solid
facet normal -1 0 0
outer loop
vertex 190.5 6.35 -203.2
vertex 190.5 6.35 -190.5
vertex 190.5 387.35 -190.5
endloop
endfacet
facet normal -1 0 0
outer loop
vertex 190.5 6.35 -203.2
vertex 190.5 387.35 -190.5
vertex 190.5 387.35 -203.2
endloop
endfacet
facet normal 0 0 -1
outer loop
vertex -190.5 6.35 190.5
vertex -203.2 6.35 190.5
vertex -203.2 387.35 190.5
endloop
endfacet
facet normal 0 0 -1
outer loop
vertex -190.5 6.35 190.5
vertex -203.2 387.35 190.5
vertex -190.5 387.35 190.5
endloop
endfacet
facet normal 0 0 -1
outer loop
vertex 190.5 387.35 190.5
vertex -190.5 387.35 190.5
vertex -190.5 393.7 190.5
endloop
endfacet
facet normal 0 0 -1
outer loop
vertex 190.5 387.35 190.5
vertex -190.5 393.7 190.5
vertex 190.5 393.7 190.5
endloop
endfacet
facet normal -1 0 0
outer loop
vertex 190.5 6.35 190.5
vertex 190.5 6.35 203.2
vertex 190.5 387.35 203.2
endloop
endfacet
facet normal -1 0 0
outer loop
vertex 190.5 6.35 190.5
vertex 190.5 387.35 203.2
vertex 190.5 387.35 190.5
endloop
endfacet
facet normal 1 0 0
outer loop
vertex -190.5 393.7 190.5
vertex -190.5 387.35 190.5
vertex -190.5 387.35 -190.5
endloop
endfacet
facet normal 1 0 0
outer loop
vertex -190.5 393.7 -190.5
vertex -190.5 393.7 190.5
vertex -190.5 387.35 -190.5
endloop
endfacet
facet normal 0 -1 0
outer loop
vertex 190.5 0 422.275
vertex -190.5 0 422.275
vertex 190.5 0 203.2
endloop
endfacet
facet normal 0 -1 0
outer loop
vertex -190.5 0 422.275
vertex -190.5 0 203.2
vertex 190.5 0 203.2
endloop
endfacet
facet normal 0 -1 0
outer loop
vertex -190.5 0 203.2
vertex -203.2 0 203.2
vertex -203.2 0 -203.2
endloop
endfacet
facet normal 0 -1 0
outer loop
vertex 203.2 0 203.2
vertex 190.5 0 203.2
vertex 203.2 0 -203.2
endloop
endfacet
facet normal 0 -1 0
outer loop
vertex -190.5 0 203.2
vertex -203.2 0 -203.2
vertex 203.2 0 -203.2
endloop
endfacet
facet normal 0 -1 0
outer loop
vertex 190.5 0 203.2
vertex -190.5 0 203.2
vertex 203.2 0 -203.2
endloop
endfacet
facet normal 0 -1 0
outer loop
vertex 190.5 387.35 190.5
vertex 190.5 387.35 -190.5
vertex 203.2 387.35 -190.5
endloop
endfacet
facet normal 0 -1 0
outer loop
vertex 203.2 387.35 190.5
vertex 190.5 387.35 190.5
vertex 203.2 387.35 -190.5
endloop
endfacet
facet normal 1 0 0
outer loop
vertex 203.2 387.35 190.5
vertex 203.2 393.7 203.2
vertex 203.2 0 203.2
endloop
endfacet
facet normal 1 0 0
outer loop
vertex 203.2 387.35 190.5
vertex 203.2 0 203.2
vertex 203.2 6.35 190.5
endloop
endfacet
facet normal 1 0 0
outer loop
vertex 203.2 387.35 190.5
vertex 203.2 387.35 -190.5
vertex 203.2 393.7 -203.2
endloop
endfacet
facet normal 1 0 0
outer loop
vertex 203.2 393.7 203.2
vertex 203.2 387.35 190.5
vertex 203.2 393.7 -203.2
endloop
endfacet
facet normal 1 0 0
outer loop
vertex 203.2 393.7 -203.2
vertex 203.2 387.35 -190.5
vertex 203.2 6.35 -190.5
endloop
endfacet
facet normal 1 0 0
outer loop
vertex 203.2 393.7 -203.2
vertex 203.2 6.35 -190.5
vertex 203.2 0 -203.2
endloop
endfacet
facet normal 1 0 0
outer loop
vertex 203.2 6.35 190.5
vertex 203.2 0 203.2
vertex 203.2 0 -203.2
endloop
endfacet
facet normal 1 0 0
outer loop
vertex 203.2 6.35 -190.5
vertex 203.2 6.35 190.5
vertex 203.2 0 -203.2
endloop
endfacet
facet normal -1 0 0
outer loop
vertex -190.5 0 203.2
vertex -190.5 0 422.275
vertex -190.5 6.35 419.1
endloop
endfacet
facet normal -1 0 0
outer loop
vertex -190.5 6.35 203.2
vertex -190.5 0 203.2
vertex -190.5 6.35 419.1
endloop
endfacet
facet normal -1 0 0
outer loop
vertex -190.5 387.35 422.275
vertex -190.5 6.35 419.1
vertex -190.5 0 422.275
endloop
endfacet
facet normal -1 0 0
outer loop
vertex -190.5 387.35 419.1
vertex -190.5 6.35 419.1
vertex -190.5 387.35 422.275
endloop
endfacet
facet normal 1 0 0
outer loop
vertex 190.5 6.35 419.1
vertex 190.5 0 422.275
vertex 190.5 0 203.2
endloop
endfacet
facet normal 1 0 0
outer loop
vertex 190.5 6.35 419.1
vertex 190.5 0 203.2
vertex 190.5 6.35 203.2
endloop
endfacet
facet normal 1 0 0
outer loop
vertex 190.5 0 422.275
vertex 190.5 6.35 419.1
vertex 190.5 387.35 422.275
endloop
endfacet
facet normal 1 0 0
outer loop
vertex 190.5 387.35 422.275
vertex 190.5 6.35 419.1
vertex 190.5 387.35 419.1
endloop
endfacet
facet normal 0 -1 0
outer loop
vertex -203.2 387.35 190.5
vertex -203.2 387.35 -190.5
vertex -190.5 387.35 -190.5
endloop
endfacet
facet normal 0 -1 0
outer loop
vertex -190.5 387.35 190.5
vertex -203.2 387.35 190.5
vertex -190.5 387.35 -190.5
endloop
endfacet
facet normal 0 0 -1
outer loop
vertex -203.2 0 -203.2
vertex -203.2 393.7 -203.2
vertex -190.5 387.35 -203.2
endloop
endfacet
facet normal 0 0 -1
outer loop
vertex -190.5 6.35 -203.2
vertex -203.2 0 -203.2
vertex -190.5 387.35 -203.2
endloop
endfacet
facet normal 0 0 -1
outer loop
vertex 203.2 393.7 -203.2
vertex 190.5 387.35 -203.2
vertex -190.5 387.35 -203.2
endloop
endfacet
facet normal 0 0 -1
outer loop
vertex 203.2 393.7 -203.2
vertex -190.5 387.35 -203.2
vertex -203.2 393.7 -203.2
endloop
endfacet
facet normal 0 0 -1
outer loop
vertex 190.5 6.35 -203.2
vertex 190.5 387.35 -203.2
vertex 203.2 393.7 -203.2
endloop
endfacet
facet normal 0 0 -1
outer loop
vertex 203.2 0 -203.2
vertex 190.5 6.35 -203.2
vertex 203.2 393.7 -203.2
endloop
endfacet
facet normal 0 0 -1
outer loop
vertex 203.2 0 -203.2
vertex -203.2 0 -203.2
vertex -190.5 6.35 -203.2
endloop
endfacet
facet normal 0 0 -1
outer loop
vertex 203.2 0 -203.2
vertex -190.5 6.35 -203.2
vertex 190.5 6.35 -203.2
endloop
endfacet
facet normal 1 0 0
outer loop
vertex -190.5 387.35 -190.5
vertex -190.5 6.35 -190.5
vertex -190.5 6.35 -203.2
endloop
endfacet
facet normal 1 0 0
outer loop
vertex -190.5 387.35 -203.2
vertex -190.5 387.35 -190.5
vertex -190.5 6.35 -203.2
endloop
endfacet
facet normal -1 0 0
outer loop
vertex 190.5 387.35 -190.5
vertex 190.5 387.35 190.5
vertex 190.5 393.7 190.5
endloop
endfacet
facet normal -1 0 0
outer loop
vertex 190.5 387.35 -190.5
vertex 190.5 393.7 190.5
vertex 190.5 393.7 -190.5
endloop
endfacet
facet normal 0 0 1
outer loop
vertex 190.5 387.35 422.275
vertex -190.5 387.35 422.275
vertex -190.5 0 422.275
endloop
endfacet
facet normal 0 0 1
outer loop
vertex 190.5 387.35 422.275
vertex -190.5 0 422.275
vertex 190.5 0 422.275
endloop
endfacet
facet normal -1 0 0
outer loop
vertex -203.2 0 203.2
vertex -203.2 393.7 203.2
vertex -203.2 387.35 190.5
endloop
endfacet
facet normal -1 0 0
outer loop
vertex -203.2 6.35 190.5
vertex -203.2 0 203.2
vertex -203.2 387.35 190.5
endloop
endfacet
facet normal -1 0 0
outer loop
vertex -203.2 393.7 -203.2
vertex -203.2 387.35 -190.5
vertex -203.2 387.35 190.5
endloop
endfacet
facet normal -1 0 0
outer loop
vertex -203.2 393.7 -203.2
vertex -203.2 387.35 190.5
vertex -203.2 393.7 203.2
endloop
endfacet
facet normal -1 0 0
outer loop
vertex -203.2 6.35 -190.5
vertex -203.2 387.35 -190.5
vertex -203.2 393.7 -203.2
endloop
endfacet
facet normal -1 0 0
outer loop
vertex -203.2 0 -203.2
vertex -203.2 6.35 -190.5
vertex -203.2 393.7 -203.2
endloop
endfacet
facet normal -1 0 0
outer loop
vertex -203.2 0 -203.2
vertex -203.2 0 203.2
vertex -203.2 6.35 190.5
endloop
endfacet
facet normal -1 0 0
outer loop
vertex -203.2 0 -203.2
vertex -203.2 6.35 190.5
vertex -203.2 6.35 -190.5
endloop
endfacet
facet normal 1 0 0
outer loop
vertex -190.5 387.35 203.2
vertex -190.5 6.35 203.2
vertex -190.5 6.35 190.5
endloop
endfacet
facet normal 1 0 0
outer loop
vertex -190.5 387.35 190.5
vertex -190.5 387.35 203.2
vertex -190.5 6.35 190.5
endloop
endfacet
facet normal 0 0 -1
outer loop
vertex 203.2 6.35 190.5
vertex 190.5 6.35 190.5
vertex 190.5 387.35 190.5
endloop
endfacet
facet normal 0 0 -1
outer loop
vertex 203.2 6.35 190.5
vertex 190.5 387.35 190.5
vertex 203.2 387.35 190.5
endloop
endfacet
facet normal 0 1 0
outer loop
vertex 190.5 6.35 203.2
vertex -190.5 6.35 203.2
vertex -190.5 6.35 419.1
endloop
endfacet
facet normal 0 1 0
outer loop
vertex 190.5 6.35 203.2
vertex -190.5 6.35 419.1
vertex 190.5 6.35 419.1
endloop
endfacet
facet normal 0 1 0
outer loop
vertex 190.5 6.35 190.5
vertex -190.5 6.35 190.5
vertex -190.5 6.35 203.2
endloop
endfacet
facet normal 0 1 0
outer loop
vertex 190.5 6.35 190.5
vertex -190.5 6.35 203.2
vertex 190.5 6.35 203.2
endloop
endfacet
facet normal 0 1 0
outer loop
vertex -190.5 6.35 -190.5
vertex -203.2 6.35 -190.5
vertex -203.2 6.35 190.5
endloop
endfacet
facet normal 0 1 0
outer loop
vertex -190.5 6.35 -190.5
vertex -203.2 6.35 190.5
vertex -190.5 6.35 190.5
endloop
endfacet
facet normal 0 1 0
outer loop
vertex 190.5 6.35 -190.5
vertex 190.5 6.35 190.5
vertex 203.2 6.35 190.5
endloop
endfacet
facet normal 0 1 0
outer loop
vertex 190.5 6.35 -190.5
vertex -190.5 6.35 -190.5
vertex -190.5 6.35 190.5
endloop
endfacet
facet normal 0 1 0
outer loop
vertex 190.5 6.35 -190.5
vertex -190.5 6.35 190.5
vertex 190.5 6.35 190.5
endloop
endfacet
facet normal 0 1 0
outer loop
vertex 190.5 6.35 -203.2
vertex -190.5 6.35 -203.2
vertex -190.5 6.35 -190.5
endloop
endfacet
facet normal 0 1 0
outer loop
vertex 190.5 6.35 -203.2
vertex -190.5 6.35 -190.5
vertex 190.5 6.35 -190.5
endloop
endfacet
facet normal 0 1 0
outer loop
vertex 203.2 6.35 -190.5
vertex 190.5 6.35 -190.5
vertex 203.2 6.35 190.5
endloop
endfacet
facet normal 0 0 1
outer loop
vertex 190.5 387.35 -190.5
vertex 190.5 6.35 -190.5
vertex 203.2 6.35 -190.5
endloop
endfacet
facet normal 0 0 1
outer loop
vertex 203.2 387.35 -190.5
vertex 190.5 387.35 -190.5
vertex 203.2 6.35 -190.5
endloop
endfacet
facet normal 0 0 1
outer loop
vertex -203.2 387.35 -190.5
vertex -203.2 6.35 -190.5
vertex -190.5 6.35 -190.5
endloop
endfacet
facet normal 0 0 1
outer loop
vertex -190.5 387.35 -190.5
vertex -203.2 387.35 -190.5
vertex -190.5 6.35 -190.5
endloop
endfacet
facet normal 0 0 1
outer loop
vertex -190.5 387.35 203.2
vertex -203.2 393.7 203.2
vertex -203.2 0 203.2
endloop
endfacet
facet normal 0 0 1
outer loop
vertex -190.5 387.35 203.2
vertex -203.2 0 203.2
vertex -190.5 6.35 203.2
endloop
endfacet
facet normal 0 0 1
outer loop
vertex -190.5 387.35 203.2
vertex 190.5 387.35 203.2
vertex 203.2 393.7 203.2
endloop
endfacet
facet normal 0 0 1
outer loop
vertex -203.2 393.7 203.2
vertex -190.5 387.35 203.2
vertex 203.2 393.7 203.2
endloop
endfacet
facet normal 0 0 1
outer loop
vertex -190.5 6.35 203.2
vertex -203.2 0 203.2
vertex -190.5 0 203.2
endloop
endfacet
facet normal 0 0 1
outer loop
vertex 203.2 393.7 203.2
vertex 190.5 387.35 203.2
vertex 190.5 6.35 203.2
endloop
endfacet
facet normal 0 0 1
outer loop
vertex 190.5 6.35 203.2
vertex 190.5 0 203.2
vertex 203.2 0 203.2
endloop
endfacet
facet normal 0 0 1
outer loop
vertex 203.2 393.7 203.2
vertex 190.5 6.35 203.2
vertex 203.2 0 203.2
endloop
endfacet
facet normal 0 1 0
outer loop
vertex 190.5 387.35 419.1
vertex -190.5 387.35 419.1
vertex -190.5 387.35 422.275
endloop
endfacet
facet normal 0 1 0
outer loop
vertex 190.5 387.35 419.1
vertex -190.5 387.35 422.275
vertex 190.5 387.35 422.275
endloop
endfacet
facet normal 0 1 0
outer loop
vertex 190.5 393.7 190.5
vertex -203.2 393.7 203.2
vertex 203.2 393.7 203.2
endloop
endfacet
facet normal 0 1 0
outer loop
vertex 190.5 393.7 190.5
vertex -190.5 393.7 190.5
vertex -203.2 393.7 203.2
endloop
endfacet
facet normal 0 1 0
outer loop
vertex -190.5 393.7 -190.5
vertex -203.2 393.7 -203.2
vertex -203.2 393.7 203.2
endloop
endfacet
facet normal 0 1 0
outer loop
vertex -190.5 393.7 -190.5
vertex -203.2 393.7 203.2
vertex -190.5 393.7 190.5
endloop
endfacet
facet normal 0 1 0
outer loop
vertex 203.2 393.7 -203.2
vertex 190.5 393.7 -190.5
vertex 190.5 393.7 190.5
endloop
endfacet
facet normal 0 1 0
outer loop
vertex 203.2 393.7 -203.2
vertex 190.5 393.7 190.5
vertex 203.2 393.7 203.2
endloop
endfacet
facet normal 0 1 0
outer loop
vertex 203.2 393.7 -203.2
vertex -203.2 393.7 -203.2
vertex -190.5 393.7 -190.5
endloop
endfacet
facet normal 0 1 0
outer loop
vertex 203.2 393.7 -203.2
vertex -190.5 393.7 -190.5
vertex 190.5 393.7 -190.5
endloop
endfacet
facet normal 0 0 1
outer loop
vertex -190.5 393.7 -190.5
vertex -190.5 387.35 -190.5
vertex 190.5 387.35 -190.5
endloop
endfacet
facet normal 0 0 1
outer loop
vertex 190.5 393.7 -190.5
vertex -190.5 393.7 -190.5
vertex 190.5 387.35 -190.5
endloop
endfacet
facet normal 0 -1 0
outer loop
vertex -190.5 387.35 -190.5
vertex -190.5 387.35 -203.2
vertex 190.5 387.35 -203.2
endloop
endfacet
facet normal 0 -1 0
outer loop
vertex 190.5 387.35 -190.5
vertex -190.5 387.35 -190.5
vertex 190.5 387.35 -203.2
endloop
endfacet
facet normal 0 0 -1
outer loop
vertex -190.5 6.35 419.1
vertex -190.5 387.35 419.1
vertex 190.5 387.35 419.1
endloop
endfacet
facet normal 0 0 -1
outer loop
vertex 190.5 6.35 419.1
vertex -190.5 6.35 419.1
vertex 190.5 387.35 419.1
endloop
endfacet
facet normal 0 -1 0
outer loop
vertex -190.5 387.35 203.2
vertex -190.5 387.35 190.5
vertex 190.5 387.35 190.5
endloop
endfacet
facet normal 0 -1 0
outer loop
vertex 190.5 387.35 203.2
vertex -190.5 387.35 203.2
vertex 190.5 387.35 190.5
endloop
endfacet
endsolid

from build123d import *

# Parameters (mm, degrees)
SKETCH1_W           = 406.4
SKETCH1_H           = 406.4
BOSS_EXTRUDE1_DEPTH = 6.35
SKETCH2_W           = 12.7
SKETCH2_H           = 12.7
BOSS_EXTRUDE2_DEPTH = 381
SKETCH3_W           = 406.4
SKETCH3_H           = 406.4
SKETCH3_W_2         = 381
SKETCH3_H_2         = 381
BOSS_EXTRUDE3_DEPTH = 6.35
SKETCH4_W           = 381
SKETCH4_H           = 228.6
BOSS_EXTRUDE4_DEPTH = 6.35
SKETCH6_W           = 381
SKETCH6_H           = 387.35
BOSS_EXTRUDE6_DEPTH = 3.175


with BuildPart() as part:
    # Sketch1 → Boss-Extrude1 (new body)
    with BuildSketch(Plane(origin=(0, 0, 0), x_dir=(1, 0, 0), z_dir=(0, 1, 0))):
        Rectangle(SKETCH1_W, SKETCH1_H)
    extrude(amount=BOSS_EXTRUDE1_DEPTH)

    # Sketch2 → Boss-Extrude2 (add)
    with BuildSketch(Plane(origin=(0, 6.35, 0), x_dir=(1, 0, 0), z_dir=(0, 1, 0))):
        with Locations((-196.85, 196.85)):
            Rectangle(SKETCH2_W, SKETCH2_H)
        with Locations((196.85, 196.85)):
            Rectangle(SKETCH2_W, SKETCH2_H)
        with Locations((196.85, -196.85)):
            Rectangle(SKETCH2_W, SKETCH2_H)
        with Locations((-196.85, -196.85)):
            Rectangle(SKETCH2_W, SKETCH2_H)
    extrude(amount=BOSS_EXTRUDE2_DEPTH)

    # Sketch3 → Boss-Extrude3 (add)
    with BuildSketch(Plane(origin=(0, 387.35, 0), x_dir=(1, 0, 0), z_dir=(0, 1, 0))):
        Rectangle(SKETCH3_W, SKETCH3_H)
        Rectangle(SKETCH3_W_2, SKETCH3_H_2, mode=Mode.SUBTRACT)
    extrude(amount=BOSS_EXTRUDE3_DEPTH)

    # Sketch4 → Boss-Extrude4 (add)
    with BuildSketch(Plane(origin=(0, 6.35, 0), x_dir=(1, 0, 0), z_dir=(0, 1, 0))):
        with Locations((0, -304.8)):
            Rectangle(SKETCH4_W, SKETCH4_H)
    extrude(amount=-BOSS_EXTRUDE4_DEPTH)

    # Sketch6 → Boss-Extrude6 (add)
    with BuildSketch(Plane.XY.offset(419.1)):
        with Locations((0, 193.675)):
            Rectangle(SKETCH6_W, SKETCH6_H)
    extrude(amount=BOSS_EXTRUDE6_DEPTH)


solid = part.part
